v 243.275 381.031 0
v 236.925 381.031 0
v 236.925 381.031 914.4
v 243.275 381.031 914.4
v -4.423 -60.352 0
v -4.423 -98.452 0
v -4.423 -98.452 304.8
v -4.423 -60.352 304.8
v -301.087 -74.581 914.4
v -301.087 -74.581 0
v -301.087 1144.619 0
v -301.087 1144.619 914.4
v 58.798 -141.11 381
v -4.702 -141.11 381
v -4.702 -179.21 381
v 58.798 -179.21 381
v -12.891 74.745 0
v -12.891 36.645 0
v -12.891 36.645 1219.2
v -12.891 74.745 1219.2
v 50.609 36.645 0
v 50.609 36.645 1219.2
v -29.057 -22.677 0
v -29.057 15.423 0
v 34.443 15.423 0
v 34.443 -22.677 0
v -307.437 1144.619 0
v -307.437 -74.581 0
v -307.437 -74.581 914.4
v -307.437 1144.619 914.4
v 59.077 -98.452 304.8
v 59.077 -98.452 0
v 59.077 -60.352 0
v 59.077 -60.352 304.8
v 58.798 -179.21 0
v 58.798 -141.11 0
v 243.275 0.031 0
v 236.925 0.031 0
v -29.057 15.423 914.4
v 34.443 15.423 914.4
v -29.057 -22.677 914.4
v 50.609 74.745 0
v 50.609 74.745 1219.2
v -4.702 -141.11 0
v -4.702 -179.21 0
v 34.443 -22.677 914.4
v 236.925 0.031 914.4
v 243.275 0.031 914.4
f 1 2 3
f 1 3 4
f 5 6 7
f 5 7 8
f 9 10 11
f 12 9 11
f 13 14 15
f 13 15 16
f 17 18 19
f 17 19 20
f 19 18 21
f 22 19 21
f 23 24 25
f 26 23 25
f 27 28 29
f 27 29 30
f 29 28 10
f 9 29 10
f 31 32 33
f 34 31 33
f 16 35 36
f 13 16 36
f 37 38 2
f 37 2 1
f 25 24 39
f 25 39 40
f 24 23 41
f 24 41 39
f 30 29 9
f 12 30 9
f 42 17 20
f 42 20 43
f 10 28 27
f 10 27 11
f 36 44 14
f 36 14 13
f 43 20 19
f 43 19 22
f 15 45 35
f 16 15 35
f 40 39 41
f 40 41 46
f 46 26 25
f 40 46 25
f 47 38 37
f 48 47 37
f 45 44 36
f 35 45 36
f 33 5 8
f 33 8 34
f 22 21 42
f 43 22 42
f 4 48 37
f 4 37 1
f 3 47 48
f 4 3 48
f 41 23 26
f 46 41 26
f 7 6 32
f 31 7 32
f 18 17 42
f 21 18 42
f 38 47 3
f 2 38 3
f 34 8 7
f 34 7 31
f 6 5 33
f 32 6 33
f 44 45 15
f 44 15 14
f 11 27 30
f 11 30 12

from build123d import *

# Parameters (mm, degrees)
F0_W      = 63.5
F0_H      = 38.1
F1_DEPTH  = 914.4
F2_W      = 63.5
F2_H      = 38.1
F3_DEPTH  = 1219.2
F4_W      = 63.5
F4_H      = 38.1
F5_DEPTH  = 304.8
F6_W      = 63.5
F6_H      = 38.1
F7_DEPTH  = 381
F8_W      = 6.35
F8_H      = 1219.2
F9_DEPTH  = 914.4
F10_W     = 6.35
F10_H     = 381
F11_DEPTH = 914.4


with BuildPart() as f1:
    # F0 (on Top) → F1 (new body)
    with BuildSketch(Plane.XY):
        with Locations((2.692844, -3.626693)):
            Rectangle(F0_W, F0_H)
    extrude(amount=F1_DEPTH)


with BuildPart() as f3:
    # F2 (on Top) → F3 (new body)
    with BuildSketch(Plane.XY):
        with Locations((18.859333, 55.695115)):
            Rectangle(F2_W, F2_H)
    extrude(amount=F3_DEPTH)


with BuildPart() as f5:
    # F4 (on Top) → F5 (new body)
    with BuildSketch(Plane.XY):
        with Locations((27.326927, -79.40179)):
            Rectangle(F4_W, F4_H)
    extrude(amount=F5_DEPTH)


with BuildPart() as f7:
    # F6 (on Top) → F7 (new body)
    with BuildSketch(Plane.XY):
        with Locations((27.047894, -160.159969)):
            Rectangle(F6_W, F6_H)
    extrude(amount=F7_DEPTH)


with BuildPart() as f9:
    # F8 (on Top) → F9 (new body)
    with BuildSketch(Plane.XY):
        with Locations((-304.261878, 535.019035)):
            Rectangle(F8_W, F8_H)
    extrude(amount=F9_DEPTH)


with BuildPart() as f11:
    # F10 (on Top) → F11 (new body)
    with BuildSketch(Plane.XY):
        with Locations((240.100078, 190.531134)):
            Rectangle(F10_W, F10_H)
    extrude(amount=F11_DEPTH)


solid = Compound([f1.part, f3.part, f5.part, f7.part, f9.part, f11.part])
